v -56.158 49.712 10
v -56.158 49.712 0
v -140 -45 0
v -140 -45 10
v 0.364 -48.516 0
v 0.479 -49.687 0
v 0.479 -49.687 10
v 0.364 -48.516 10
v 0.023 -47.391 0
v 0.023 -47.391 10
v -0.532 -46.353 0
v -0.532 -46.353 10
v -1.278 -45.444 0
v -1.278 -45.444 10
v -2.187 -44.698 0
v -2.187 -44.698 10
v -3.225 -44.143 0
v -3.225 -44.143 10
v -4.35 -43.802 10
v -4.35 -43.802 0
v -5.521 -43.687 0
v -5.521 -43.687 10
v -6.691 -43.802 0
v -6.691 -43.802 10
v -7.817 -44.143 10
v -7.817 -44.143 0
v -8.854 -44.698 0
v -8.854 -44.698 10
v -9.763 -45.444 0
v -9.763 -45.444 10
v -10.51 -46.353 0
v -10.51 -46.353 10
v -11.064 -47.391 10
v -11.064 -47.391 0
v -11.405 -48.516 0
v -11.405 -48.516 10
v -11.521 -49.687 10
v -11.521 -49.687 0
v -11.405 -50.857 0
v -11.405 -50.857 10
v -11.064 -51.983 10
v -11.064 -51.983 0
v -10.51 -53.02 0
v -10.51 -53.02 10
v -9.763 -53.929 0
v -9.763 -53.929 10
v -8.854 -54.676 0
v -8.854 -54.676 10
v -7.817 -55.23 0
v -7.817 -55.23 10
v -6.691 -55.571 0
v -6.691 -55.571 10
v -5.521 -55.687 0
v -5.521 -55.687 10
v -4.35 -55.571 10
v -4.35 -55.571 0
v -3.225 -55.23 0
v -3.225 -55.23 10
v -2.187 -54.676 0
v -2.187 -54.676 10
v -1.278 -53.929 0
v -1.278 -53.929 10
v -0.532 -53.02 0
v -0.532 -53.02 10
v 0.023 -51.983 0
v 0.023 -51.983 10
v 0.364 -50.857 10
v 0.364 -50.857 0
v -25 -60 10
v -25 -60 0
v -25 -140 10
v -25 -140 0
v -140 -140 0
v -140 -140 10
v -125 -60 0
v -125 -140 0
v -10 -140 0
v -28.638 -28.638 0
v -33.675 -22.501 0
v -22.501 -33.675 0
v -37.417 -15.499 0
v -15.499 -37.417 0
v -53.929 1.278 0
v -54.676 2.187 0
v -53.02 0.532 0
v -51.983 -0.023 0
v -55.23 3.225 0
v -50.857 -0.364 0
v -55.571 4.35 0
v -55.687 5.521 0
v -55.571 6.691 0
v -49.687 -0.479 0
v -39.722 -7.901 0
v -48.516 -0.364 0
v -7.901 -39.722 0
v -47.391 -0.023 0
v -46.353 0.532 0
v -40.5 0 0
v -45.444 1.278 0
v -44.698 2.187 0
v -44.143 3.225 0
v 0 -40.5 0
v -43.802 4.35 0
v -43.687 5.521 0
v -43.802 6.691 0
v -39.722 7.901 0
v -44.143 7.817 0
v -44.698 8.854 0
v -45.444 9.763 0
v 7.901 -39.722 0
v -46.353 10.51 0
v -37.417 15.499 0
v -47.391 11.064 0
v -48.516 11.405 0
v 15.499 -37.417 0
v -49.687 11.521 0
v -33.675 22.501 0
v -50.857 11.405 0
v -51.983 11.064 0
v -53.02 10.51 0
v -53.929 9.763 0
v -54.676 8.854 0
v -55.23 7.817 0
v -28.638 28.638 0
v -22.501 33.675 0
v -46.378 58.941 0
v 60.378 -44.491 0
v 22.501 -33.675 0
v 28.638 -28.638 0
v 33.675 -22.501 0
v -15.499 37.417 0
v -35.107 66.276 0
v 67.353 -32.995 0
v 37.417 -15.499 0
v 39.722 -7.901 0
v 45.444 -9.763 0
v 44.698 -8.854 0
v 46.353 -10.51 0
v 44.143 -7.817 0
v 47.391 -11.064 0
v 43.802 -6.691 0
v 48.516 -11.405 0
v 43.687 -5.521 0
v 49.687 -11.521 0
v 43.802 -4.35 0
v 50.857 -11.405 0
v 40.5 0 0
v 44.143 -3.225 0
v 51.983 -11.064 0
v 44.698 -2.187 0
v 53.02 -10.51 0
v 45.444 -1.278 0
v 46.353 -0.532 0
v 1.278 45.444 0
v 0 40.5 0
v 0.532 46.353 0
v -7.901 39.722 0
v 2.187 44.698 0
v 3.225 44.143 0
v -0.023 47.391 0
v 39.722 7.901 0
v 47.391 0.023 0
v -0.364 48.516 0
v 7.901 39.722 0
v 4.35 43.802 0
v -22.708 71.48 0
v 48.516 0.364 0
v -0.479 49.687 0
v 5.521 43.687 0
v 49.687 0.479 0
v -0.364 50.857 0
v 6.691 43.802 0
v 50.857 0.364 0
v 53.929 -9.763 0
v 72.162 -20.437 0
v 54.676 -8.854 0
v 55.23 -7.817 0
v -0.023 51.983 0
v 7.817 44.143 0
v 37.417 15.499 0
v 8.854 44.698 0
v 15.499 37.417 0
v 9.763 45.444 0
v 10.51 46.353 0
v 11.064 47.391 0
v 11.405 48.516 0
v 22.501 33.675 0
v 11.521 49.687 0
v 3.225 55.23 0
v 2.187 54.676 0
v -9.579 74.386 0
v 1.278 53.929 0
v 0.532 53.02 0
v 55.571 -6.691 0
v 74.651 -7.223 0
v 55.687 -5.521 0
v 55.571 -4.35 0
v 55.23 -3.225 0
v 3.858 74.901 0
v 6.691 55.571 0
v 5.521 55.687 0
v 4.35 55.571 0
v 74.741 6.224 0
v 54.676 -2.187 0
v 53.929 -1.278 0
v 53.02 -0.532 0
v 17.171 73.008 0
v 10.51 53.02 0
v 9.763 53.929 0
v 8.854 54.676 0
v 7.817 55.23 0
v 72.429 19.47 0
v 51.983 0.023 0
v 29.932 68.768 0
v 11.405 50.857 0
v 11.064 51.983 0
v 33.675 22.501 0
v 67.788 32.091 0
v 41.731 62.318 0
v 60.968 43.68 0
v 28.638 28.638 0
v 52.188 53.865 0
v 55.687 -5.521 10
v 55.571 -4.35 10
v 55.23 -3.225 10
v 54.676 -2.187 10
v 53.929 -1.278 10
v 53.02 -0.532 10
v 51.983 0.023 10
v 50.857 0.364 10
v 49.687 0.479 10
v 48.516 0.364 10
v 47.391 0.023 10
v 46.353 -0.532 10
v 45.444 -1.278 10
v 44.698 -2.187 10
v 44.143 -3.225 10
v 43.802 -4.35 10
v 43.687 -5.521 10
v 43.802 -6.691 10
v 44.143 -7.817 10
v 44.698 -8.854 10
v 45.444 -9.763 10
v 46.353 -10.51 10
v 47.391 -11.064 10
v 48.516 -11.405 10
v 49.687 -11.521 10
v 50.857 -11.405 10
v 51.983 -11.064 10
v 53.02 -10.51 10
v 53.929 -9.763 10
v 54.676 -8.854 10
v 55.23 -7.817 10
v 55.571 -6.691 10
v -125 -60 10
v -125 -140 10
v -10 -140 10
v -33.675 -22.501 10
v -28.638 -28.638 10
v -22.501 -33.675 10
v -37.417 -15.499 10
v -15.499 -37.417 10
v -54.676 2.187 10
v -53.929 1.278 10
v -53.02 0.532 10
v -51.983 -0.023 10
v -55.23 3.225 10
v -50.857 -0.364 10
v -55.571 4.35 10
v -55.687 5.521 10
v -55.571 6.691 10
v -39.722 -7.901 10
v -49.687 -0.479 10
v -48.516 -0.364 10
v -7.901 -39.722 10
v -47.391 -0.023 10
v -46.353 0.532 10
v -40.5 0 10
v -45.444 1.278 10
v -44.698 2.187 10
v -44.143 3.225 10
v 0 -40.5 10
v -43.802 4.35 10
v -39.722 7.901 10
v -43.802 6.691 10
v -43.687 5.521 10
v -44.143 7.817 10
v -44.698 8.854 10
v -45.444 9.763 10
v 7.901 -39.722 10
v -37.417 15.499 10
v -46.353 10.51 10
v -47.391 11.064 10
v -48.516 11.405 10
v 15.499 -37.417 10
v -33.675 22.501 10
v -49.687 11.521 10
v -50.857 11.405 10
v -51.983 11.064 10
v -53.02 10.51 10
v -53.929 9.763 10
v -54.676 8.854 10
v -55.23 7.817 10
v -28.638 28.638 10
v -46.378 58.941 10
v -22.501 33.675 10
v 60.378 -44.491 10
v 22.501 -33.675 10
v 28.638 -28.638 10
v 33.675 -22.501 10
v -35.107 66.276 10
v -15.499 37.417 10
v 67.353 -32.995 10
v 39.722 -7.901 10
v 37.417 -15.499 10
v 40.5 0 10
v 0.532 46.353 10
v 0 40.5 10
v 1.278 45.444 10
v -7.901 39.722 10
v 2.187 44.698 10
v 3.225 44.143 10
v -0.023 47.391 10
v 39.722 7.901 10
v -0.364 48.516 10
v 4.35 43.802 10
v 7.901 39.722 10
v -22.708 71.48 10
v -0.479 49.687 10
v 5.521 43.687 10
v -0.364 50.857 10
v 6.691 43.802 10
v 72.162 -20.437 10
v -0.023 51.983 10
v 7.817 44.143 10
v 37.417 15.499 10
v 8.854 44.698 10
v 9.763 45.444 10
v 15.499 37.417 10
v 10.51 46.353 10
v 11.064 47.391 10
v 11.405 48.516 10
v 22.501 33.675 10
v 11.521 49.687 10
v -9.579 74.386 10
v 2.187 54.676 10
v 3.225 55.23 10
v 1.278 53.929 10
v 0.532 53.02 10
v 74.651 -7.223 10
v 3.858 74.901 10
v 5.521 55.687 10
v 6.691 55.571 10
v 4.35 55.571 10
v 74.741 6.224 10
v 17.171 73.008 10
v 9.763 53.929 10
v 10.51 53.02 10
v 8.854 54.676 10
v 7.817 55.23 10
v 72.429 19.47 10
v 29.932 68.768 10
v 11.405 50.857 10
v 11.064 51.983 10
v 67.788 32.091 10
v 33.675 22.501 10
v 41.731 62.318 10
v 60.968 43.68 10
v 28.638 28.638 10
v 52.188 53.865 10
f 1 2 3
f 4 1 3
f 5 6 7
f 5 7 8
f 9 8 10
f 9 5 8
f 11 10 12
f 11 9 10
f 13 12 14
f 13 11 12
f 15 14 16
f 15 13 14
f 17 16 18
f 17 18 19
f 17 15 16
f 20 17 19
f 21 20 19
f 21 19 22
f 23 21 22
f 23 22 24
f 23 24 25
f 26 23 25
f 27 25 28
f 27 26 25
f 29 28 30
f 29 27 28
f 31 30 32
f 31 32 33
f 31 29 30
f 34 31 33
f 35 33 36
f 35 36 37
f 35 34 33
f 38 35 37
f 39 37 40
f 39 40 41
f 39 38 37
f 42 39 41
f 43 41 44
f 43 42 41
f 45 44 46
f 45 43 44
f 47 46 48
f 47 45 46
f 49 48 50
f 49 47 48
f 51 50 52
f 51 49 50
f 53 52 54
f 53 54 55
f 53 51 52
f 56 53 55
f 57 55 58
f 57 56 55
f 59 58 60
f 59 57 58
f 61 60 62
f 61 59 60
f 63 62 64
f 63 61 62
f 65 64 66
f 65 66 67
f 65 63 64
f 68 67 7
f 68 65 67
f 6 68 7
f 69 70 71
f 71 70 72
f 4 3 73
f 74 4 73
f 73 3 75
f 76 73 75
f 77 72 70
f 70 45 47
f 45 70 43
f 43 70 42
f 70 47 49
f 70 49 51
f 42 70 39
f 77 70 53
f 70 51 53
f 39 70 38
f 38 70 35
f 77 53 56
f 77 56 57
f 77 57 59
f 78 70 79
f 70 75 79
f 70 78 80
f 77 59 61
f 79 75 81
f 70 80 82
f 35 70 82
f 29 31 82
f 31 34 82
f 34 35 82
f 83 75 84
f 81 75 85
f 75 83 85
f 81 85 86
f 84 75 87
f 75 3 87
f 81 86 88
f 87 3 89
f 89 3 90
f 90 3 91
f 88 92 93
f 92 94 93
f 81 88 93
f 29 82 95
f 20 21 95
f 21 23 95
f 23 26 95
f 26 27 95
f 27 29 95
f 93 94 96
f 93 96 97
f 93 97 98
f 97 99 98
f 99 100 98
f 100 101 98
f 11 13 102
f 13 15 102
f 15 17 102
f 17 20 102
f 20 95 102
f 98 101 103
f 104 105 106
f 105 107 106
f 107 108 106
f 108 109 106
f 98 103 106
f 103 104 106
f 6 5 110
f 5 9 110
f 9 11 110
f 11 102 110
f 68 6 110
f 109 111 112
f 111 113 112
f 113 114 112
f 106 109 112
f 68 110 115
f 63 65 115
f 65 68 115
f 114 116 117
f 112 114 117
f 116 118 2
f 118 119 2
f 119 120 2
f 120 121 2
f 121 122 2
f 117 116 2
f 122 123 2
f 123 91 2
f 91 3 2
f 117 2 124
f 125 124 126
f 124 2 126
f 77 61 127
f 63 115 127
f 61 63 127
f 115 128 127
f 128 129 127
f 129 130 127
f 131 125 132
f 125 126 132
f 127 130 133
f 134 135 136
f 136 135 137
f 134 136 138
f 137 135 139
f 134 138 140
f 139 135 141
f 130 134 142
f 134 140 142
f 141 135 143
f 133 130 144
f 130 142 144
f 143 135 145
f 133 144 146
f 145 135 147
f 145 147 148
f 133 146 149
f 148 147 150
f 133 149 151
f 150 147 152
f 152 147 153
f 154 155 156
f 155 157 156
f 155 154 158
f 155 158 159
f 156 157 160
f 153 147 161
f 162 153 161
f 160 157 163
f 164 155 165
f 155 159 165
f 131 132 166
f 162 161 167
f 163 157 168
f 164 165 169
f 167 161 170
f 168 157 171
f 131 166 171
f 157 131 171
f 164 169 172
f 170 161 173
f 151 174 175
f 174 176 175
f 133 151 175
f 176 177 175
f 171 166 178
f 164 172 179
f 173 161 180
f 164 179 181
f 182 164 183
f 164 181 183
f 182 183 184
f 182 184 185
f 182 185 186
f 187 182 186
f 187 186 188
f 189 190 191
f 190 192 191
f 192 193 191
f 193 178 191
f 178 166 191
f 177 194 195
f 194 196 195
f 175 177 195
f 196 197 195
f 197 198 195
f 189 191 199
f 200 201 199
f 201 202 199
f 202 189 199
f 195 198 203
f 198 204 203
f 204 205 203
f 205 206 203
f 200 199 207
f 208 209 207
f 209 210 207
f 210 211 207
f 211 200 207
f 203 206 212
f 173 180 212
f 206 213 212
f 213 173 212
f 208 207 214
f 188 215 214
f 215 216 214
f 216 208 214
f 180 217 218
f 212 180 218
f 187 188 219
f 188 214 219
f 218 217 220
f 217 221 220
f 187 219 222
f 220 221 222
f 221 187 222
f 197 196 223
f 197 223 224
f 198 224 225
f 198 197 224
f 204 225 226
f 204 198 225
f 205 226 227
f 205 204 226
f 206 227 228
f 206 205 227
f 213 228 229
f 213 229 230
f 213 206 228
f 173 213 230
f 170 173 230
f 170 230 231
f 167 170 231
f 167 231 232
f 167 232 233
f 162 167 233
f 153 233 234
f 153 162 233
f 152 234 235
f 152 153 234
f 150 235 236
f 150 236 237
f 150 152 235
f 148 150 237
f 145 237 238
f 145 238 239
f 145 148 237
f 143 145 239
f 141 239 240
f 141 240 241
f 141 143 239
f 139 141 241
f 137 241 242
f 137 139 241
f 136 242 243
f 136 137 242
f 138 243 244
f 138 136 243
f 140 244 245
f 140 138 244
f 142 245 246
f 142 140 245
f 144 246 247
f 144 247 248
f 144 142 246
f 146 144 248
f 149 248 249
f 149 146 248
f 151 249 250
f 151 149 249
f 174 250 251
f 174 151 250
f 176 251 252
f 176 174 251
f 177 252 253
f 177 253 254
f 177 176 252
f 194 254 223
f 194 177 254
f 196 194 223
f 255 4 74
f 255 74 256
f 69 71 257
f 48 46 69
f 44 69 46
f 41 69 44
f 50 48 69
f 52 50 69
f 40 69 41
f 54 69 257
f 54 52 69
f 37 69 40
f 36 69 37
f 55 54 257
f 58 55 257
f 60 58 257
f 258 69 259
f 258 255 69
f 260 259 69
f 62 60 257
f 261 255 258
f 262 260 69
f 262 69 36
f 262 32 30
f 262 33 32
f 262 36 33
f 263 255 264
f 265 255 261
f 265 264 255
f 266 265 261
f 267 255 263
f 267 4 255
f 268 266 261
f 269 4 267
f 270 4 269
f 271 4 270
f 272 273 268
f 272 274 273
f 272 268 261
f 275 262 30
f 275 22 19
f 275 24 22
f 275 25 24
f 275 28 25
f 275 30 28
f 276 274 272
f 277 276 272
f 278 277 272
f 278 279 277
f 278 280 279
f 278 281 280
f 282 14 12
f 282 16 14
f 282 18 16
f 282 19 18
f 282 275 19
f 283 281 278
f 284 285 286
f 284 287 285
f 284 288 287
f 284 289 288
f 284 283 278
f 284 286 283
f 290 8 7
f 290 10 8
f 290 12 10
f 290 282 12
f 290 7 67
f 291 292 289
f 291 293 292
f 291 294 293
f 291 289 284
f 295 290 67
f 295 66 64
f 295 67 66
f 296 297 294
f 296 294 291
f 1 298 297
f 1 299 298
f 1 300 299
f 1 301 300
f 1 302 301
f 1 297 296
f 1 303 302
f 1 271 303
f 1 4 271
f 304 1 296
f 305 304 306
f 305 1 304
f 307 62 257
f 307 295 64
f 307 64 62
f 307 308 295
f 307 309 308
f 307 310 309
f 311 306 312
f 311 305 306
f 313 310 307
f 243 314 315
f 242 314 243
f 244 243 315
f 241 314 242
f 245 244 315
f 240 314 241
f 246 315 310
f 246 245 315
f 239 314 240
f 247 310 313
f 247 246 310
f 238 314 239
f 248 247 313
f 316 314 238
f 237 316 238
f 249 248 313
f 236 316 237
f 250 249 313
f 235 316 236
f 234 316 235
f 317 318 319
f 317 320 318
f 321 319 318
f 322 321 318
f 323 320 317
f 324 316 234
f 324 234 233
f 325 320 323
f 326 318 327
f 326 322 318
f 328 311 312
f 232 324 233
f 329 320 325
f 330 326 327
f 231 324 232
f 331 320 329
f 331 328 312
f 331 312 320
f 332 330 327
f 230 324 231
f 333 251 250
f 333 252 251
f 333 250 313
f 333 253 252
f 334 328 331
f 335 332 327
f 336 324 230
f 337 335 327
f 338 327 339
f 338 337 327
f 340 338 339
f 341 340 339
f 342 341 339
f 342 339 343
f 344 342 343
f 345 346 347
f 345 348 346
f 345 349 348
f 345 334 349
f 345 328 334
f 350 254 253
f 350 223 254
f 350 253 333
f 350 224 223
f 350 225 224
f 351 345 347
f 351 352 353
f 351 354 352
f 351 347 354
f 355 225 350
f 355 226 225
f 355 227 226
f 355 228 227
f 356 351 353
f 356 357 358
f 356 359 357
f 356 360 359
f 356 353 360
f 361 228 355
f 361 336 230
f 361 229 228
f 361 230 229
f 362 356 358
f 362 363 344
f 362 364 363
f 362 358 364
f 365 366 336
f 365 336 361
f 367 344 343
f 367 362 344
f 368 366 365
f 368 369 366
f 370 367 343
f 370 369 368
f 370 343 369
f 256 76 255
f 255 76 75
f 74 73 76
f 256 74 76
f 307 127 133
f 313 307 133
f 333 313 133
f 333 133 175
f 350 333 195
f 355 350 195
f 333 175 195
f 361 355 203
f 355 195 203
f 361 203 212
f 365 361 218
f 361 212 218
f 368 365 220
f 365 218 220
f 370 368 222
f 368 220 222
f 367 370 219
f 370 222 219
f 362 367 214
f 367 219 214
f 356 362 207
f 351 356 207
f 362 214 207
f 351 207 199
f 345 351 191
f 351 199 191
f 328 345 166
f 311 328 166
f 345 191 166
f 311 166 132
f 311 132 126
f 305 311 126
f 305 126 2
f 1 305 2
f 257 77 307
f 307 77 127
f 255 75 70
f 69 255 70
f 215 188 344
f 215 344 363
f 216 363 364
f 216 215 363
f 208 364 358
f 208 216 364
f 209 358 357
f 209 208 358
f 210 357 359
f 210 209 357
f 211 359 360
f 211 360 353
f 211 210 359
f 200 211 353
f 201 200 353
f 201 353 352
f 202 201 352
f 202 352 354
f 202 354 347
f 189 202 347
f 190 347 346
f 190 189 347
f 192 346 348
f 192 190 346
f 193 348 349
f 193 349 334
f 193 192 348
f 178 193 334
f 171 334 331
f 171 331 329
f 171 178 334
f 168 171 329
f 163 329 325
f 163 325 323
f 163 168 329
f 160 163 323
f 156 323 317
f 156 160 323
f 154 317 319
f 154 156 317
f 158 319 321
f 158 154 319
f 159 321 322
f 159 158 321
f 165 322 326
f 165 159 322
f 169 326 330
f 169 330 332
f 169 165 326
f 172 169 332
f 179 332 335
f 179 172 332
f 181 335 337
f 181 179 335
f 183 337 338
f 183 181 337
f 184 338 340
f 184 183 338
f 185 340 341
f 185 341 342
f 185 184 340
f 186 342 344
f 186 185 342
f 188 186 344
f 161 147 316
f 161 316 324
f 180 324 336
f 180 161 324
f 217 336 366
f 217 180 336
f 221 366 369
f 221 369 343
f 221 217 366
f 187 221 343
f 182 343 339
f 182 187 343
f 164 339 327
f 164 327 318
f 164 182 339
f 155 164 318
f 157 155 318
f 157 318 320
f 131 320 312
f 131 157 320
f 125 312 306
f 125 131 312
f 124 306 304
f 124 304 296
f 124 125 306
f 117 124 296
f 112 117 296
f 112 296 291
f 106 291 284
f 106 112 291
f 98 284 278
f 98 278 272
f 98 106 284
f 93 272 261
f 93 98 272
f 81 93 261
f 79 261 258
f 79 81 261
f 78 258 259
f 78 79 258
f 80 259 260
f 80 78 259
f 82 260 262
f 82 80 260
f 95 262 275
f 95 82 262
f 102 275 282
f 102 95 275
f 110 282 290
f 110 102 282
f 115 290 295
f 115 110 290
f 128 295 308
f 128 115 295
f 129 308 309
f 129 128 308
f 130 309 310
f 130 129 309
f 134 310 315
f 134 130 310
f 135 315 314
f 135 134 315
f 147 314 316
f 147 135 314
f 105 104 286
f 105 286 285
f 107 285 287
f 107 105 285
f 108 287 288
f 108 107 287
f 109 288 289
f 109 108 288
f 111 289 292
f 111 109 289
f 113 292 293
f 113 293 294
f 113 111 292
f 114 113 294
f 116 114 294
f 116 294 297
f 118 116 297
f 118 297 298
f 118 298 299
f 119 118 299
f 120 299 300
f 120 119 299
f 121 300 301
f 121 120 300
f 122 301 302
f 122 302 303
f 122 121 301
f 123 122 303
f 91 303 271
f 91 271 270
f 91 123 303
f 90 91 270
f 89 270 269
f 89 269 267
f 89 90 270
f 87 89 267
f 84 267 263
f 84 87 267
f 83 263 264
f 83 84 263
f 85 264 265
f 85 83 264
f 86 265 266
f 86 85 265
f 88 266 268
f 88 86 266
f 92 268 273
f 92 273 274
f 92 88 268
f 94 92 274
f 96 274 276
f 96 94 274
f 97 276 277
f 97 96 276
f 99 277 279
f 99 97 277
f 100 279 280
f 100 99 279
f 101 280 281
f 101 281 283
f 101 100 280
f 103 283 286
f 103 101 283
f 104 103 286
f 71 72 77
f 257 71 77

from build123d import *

# Parameters (mm, degrees)
ESQUISSE1_R        = 40.5
ESQUISSE1_R_2      = 6
BOSS_EXTRU_1_DEPTH = 10


with BuildPart() as part:
    # Esquisse1 → Boss.-Extru.1 (new body)
    with BuildSketch(Plane.XY):
        with BuildLine():
            Line((-25, -140), (-10, -140))
            Line((-10, -140), (60.378177886, -44.49129842))
            ThreePointArc((60.378177886, -44.49129842), (47.149121788, 58.326326085), (-56.15757152, 49.712444729))
            Line((-56.15757152, 49.712444729), (-140, -45))
            Line((-140, -45), (-140, -140))
            Line((-140, -140), (-125, -140))
            Line((-125, -140), (-125, -60))
            Line((-125, -60), (-25, -60))
            Line((-25, -60), (-25, -140))
        make_face()
        Circle(ESQUISSE1_R, mode=Mode.SUBTRACT)
        with Locations((-49.686682345, 5.520742483)):
            Circle(ESQUISSE1_R_2, mode=Mode.SUBTRACT)
        with Locations((5.520742483, 49.686682345)):
            Circle(ESQUISSE1_R_2, mode=Mode.SUBTRACT)
        with Locations((49.686682345, -5.520742483)):
            Circle(ESQUISSE1_R_2, mode=Mode.SUBTRACT)
        with Locations((-5.520742483, -49.686682345)):
            Circle(ESQUISSE1_R_2, mode=Mode.SUBTRACT)
    extrude(amount=BOSS_EXTRU_1_DEPTH)


solid = part.part
